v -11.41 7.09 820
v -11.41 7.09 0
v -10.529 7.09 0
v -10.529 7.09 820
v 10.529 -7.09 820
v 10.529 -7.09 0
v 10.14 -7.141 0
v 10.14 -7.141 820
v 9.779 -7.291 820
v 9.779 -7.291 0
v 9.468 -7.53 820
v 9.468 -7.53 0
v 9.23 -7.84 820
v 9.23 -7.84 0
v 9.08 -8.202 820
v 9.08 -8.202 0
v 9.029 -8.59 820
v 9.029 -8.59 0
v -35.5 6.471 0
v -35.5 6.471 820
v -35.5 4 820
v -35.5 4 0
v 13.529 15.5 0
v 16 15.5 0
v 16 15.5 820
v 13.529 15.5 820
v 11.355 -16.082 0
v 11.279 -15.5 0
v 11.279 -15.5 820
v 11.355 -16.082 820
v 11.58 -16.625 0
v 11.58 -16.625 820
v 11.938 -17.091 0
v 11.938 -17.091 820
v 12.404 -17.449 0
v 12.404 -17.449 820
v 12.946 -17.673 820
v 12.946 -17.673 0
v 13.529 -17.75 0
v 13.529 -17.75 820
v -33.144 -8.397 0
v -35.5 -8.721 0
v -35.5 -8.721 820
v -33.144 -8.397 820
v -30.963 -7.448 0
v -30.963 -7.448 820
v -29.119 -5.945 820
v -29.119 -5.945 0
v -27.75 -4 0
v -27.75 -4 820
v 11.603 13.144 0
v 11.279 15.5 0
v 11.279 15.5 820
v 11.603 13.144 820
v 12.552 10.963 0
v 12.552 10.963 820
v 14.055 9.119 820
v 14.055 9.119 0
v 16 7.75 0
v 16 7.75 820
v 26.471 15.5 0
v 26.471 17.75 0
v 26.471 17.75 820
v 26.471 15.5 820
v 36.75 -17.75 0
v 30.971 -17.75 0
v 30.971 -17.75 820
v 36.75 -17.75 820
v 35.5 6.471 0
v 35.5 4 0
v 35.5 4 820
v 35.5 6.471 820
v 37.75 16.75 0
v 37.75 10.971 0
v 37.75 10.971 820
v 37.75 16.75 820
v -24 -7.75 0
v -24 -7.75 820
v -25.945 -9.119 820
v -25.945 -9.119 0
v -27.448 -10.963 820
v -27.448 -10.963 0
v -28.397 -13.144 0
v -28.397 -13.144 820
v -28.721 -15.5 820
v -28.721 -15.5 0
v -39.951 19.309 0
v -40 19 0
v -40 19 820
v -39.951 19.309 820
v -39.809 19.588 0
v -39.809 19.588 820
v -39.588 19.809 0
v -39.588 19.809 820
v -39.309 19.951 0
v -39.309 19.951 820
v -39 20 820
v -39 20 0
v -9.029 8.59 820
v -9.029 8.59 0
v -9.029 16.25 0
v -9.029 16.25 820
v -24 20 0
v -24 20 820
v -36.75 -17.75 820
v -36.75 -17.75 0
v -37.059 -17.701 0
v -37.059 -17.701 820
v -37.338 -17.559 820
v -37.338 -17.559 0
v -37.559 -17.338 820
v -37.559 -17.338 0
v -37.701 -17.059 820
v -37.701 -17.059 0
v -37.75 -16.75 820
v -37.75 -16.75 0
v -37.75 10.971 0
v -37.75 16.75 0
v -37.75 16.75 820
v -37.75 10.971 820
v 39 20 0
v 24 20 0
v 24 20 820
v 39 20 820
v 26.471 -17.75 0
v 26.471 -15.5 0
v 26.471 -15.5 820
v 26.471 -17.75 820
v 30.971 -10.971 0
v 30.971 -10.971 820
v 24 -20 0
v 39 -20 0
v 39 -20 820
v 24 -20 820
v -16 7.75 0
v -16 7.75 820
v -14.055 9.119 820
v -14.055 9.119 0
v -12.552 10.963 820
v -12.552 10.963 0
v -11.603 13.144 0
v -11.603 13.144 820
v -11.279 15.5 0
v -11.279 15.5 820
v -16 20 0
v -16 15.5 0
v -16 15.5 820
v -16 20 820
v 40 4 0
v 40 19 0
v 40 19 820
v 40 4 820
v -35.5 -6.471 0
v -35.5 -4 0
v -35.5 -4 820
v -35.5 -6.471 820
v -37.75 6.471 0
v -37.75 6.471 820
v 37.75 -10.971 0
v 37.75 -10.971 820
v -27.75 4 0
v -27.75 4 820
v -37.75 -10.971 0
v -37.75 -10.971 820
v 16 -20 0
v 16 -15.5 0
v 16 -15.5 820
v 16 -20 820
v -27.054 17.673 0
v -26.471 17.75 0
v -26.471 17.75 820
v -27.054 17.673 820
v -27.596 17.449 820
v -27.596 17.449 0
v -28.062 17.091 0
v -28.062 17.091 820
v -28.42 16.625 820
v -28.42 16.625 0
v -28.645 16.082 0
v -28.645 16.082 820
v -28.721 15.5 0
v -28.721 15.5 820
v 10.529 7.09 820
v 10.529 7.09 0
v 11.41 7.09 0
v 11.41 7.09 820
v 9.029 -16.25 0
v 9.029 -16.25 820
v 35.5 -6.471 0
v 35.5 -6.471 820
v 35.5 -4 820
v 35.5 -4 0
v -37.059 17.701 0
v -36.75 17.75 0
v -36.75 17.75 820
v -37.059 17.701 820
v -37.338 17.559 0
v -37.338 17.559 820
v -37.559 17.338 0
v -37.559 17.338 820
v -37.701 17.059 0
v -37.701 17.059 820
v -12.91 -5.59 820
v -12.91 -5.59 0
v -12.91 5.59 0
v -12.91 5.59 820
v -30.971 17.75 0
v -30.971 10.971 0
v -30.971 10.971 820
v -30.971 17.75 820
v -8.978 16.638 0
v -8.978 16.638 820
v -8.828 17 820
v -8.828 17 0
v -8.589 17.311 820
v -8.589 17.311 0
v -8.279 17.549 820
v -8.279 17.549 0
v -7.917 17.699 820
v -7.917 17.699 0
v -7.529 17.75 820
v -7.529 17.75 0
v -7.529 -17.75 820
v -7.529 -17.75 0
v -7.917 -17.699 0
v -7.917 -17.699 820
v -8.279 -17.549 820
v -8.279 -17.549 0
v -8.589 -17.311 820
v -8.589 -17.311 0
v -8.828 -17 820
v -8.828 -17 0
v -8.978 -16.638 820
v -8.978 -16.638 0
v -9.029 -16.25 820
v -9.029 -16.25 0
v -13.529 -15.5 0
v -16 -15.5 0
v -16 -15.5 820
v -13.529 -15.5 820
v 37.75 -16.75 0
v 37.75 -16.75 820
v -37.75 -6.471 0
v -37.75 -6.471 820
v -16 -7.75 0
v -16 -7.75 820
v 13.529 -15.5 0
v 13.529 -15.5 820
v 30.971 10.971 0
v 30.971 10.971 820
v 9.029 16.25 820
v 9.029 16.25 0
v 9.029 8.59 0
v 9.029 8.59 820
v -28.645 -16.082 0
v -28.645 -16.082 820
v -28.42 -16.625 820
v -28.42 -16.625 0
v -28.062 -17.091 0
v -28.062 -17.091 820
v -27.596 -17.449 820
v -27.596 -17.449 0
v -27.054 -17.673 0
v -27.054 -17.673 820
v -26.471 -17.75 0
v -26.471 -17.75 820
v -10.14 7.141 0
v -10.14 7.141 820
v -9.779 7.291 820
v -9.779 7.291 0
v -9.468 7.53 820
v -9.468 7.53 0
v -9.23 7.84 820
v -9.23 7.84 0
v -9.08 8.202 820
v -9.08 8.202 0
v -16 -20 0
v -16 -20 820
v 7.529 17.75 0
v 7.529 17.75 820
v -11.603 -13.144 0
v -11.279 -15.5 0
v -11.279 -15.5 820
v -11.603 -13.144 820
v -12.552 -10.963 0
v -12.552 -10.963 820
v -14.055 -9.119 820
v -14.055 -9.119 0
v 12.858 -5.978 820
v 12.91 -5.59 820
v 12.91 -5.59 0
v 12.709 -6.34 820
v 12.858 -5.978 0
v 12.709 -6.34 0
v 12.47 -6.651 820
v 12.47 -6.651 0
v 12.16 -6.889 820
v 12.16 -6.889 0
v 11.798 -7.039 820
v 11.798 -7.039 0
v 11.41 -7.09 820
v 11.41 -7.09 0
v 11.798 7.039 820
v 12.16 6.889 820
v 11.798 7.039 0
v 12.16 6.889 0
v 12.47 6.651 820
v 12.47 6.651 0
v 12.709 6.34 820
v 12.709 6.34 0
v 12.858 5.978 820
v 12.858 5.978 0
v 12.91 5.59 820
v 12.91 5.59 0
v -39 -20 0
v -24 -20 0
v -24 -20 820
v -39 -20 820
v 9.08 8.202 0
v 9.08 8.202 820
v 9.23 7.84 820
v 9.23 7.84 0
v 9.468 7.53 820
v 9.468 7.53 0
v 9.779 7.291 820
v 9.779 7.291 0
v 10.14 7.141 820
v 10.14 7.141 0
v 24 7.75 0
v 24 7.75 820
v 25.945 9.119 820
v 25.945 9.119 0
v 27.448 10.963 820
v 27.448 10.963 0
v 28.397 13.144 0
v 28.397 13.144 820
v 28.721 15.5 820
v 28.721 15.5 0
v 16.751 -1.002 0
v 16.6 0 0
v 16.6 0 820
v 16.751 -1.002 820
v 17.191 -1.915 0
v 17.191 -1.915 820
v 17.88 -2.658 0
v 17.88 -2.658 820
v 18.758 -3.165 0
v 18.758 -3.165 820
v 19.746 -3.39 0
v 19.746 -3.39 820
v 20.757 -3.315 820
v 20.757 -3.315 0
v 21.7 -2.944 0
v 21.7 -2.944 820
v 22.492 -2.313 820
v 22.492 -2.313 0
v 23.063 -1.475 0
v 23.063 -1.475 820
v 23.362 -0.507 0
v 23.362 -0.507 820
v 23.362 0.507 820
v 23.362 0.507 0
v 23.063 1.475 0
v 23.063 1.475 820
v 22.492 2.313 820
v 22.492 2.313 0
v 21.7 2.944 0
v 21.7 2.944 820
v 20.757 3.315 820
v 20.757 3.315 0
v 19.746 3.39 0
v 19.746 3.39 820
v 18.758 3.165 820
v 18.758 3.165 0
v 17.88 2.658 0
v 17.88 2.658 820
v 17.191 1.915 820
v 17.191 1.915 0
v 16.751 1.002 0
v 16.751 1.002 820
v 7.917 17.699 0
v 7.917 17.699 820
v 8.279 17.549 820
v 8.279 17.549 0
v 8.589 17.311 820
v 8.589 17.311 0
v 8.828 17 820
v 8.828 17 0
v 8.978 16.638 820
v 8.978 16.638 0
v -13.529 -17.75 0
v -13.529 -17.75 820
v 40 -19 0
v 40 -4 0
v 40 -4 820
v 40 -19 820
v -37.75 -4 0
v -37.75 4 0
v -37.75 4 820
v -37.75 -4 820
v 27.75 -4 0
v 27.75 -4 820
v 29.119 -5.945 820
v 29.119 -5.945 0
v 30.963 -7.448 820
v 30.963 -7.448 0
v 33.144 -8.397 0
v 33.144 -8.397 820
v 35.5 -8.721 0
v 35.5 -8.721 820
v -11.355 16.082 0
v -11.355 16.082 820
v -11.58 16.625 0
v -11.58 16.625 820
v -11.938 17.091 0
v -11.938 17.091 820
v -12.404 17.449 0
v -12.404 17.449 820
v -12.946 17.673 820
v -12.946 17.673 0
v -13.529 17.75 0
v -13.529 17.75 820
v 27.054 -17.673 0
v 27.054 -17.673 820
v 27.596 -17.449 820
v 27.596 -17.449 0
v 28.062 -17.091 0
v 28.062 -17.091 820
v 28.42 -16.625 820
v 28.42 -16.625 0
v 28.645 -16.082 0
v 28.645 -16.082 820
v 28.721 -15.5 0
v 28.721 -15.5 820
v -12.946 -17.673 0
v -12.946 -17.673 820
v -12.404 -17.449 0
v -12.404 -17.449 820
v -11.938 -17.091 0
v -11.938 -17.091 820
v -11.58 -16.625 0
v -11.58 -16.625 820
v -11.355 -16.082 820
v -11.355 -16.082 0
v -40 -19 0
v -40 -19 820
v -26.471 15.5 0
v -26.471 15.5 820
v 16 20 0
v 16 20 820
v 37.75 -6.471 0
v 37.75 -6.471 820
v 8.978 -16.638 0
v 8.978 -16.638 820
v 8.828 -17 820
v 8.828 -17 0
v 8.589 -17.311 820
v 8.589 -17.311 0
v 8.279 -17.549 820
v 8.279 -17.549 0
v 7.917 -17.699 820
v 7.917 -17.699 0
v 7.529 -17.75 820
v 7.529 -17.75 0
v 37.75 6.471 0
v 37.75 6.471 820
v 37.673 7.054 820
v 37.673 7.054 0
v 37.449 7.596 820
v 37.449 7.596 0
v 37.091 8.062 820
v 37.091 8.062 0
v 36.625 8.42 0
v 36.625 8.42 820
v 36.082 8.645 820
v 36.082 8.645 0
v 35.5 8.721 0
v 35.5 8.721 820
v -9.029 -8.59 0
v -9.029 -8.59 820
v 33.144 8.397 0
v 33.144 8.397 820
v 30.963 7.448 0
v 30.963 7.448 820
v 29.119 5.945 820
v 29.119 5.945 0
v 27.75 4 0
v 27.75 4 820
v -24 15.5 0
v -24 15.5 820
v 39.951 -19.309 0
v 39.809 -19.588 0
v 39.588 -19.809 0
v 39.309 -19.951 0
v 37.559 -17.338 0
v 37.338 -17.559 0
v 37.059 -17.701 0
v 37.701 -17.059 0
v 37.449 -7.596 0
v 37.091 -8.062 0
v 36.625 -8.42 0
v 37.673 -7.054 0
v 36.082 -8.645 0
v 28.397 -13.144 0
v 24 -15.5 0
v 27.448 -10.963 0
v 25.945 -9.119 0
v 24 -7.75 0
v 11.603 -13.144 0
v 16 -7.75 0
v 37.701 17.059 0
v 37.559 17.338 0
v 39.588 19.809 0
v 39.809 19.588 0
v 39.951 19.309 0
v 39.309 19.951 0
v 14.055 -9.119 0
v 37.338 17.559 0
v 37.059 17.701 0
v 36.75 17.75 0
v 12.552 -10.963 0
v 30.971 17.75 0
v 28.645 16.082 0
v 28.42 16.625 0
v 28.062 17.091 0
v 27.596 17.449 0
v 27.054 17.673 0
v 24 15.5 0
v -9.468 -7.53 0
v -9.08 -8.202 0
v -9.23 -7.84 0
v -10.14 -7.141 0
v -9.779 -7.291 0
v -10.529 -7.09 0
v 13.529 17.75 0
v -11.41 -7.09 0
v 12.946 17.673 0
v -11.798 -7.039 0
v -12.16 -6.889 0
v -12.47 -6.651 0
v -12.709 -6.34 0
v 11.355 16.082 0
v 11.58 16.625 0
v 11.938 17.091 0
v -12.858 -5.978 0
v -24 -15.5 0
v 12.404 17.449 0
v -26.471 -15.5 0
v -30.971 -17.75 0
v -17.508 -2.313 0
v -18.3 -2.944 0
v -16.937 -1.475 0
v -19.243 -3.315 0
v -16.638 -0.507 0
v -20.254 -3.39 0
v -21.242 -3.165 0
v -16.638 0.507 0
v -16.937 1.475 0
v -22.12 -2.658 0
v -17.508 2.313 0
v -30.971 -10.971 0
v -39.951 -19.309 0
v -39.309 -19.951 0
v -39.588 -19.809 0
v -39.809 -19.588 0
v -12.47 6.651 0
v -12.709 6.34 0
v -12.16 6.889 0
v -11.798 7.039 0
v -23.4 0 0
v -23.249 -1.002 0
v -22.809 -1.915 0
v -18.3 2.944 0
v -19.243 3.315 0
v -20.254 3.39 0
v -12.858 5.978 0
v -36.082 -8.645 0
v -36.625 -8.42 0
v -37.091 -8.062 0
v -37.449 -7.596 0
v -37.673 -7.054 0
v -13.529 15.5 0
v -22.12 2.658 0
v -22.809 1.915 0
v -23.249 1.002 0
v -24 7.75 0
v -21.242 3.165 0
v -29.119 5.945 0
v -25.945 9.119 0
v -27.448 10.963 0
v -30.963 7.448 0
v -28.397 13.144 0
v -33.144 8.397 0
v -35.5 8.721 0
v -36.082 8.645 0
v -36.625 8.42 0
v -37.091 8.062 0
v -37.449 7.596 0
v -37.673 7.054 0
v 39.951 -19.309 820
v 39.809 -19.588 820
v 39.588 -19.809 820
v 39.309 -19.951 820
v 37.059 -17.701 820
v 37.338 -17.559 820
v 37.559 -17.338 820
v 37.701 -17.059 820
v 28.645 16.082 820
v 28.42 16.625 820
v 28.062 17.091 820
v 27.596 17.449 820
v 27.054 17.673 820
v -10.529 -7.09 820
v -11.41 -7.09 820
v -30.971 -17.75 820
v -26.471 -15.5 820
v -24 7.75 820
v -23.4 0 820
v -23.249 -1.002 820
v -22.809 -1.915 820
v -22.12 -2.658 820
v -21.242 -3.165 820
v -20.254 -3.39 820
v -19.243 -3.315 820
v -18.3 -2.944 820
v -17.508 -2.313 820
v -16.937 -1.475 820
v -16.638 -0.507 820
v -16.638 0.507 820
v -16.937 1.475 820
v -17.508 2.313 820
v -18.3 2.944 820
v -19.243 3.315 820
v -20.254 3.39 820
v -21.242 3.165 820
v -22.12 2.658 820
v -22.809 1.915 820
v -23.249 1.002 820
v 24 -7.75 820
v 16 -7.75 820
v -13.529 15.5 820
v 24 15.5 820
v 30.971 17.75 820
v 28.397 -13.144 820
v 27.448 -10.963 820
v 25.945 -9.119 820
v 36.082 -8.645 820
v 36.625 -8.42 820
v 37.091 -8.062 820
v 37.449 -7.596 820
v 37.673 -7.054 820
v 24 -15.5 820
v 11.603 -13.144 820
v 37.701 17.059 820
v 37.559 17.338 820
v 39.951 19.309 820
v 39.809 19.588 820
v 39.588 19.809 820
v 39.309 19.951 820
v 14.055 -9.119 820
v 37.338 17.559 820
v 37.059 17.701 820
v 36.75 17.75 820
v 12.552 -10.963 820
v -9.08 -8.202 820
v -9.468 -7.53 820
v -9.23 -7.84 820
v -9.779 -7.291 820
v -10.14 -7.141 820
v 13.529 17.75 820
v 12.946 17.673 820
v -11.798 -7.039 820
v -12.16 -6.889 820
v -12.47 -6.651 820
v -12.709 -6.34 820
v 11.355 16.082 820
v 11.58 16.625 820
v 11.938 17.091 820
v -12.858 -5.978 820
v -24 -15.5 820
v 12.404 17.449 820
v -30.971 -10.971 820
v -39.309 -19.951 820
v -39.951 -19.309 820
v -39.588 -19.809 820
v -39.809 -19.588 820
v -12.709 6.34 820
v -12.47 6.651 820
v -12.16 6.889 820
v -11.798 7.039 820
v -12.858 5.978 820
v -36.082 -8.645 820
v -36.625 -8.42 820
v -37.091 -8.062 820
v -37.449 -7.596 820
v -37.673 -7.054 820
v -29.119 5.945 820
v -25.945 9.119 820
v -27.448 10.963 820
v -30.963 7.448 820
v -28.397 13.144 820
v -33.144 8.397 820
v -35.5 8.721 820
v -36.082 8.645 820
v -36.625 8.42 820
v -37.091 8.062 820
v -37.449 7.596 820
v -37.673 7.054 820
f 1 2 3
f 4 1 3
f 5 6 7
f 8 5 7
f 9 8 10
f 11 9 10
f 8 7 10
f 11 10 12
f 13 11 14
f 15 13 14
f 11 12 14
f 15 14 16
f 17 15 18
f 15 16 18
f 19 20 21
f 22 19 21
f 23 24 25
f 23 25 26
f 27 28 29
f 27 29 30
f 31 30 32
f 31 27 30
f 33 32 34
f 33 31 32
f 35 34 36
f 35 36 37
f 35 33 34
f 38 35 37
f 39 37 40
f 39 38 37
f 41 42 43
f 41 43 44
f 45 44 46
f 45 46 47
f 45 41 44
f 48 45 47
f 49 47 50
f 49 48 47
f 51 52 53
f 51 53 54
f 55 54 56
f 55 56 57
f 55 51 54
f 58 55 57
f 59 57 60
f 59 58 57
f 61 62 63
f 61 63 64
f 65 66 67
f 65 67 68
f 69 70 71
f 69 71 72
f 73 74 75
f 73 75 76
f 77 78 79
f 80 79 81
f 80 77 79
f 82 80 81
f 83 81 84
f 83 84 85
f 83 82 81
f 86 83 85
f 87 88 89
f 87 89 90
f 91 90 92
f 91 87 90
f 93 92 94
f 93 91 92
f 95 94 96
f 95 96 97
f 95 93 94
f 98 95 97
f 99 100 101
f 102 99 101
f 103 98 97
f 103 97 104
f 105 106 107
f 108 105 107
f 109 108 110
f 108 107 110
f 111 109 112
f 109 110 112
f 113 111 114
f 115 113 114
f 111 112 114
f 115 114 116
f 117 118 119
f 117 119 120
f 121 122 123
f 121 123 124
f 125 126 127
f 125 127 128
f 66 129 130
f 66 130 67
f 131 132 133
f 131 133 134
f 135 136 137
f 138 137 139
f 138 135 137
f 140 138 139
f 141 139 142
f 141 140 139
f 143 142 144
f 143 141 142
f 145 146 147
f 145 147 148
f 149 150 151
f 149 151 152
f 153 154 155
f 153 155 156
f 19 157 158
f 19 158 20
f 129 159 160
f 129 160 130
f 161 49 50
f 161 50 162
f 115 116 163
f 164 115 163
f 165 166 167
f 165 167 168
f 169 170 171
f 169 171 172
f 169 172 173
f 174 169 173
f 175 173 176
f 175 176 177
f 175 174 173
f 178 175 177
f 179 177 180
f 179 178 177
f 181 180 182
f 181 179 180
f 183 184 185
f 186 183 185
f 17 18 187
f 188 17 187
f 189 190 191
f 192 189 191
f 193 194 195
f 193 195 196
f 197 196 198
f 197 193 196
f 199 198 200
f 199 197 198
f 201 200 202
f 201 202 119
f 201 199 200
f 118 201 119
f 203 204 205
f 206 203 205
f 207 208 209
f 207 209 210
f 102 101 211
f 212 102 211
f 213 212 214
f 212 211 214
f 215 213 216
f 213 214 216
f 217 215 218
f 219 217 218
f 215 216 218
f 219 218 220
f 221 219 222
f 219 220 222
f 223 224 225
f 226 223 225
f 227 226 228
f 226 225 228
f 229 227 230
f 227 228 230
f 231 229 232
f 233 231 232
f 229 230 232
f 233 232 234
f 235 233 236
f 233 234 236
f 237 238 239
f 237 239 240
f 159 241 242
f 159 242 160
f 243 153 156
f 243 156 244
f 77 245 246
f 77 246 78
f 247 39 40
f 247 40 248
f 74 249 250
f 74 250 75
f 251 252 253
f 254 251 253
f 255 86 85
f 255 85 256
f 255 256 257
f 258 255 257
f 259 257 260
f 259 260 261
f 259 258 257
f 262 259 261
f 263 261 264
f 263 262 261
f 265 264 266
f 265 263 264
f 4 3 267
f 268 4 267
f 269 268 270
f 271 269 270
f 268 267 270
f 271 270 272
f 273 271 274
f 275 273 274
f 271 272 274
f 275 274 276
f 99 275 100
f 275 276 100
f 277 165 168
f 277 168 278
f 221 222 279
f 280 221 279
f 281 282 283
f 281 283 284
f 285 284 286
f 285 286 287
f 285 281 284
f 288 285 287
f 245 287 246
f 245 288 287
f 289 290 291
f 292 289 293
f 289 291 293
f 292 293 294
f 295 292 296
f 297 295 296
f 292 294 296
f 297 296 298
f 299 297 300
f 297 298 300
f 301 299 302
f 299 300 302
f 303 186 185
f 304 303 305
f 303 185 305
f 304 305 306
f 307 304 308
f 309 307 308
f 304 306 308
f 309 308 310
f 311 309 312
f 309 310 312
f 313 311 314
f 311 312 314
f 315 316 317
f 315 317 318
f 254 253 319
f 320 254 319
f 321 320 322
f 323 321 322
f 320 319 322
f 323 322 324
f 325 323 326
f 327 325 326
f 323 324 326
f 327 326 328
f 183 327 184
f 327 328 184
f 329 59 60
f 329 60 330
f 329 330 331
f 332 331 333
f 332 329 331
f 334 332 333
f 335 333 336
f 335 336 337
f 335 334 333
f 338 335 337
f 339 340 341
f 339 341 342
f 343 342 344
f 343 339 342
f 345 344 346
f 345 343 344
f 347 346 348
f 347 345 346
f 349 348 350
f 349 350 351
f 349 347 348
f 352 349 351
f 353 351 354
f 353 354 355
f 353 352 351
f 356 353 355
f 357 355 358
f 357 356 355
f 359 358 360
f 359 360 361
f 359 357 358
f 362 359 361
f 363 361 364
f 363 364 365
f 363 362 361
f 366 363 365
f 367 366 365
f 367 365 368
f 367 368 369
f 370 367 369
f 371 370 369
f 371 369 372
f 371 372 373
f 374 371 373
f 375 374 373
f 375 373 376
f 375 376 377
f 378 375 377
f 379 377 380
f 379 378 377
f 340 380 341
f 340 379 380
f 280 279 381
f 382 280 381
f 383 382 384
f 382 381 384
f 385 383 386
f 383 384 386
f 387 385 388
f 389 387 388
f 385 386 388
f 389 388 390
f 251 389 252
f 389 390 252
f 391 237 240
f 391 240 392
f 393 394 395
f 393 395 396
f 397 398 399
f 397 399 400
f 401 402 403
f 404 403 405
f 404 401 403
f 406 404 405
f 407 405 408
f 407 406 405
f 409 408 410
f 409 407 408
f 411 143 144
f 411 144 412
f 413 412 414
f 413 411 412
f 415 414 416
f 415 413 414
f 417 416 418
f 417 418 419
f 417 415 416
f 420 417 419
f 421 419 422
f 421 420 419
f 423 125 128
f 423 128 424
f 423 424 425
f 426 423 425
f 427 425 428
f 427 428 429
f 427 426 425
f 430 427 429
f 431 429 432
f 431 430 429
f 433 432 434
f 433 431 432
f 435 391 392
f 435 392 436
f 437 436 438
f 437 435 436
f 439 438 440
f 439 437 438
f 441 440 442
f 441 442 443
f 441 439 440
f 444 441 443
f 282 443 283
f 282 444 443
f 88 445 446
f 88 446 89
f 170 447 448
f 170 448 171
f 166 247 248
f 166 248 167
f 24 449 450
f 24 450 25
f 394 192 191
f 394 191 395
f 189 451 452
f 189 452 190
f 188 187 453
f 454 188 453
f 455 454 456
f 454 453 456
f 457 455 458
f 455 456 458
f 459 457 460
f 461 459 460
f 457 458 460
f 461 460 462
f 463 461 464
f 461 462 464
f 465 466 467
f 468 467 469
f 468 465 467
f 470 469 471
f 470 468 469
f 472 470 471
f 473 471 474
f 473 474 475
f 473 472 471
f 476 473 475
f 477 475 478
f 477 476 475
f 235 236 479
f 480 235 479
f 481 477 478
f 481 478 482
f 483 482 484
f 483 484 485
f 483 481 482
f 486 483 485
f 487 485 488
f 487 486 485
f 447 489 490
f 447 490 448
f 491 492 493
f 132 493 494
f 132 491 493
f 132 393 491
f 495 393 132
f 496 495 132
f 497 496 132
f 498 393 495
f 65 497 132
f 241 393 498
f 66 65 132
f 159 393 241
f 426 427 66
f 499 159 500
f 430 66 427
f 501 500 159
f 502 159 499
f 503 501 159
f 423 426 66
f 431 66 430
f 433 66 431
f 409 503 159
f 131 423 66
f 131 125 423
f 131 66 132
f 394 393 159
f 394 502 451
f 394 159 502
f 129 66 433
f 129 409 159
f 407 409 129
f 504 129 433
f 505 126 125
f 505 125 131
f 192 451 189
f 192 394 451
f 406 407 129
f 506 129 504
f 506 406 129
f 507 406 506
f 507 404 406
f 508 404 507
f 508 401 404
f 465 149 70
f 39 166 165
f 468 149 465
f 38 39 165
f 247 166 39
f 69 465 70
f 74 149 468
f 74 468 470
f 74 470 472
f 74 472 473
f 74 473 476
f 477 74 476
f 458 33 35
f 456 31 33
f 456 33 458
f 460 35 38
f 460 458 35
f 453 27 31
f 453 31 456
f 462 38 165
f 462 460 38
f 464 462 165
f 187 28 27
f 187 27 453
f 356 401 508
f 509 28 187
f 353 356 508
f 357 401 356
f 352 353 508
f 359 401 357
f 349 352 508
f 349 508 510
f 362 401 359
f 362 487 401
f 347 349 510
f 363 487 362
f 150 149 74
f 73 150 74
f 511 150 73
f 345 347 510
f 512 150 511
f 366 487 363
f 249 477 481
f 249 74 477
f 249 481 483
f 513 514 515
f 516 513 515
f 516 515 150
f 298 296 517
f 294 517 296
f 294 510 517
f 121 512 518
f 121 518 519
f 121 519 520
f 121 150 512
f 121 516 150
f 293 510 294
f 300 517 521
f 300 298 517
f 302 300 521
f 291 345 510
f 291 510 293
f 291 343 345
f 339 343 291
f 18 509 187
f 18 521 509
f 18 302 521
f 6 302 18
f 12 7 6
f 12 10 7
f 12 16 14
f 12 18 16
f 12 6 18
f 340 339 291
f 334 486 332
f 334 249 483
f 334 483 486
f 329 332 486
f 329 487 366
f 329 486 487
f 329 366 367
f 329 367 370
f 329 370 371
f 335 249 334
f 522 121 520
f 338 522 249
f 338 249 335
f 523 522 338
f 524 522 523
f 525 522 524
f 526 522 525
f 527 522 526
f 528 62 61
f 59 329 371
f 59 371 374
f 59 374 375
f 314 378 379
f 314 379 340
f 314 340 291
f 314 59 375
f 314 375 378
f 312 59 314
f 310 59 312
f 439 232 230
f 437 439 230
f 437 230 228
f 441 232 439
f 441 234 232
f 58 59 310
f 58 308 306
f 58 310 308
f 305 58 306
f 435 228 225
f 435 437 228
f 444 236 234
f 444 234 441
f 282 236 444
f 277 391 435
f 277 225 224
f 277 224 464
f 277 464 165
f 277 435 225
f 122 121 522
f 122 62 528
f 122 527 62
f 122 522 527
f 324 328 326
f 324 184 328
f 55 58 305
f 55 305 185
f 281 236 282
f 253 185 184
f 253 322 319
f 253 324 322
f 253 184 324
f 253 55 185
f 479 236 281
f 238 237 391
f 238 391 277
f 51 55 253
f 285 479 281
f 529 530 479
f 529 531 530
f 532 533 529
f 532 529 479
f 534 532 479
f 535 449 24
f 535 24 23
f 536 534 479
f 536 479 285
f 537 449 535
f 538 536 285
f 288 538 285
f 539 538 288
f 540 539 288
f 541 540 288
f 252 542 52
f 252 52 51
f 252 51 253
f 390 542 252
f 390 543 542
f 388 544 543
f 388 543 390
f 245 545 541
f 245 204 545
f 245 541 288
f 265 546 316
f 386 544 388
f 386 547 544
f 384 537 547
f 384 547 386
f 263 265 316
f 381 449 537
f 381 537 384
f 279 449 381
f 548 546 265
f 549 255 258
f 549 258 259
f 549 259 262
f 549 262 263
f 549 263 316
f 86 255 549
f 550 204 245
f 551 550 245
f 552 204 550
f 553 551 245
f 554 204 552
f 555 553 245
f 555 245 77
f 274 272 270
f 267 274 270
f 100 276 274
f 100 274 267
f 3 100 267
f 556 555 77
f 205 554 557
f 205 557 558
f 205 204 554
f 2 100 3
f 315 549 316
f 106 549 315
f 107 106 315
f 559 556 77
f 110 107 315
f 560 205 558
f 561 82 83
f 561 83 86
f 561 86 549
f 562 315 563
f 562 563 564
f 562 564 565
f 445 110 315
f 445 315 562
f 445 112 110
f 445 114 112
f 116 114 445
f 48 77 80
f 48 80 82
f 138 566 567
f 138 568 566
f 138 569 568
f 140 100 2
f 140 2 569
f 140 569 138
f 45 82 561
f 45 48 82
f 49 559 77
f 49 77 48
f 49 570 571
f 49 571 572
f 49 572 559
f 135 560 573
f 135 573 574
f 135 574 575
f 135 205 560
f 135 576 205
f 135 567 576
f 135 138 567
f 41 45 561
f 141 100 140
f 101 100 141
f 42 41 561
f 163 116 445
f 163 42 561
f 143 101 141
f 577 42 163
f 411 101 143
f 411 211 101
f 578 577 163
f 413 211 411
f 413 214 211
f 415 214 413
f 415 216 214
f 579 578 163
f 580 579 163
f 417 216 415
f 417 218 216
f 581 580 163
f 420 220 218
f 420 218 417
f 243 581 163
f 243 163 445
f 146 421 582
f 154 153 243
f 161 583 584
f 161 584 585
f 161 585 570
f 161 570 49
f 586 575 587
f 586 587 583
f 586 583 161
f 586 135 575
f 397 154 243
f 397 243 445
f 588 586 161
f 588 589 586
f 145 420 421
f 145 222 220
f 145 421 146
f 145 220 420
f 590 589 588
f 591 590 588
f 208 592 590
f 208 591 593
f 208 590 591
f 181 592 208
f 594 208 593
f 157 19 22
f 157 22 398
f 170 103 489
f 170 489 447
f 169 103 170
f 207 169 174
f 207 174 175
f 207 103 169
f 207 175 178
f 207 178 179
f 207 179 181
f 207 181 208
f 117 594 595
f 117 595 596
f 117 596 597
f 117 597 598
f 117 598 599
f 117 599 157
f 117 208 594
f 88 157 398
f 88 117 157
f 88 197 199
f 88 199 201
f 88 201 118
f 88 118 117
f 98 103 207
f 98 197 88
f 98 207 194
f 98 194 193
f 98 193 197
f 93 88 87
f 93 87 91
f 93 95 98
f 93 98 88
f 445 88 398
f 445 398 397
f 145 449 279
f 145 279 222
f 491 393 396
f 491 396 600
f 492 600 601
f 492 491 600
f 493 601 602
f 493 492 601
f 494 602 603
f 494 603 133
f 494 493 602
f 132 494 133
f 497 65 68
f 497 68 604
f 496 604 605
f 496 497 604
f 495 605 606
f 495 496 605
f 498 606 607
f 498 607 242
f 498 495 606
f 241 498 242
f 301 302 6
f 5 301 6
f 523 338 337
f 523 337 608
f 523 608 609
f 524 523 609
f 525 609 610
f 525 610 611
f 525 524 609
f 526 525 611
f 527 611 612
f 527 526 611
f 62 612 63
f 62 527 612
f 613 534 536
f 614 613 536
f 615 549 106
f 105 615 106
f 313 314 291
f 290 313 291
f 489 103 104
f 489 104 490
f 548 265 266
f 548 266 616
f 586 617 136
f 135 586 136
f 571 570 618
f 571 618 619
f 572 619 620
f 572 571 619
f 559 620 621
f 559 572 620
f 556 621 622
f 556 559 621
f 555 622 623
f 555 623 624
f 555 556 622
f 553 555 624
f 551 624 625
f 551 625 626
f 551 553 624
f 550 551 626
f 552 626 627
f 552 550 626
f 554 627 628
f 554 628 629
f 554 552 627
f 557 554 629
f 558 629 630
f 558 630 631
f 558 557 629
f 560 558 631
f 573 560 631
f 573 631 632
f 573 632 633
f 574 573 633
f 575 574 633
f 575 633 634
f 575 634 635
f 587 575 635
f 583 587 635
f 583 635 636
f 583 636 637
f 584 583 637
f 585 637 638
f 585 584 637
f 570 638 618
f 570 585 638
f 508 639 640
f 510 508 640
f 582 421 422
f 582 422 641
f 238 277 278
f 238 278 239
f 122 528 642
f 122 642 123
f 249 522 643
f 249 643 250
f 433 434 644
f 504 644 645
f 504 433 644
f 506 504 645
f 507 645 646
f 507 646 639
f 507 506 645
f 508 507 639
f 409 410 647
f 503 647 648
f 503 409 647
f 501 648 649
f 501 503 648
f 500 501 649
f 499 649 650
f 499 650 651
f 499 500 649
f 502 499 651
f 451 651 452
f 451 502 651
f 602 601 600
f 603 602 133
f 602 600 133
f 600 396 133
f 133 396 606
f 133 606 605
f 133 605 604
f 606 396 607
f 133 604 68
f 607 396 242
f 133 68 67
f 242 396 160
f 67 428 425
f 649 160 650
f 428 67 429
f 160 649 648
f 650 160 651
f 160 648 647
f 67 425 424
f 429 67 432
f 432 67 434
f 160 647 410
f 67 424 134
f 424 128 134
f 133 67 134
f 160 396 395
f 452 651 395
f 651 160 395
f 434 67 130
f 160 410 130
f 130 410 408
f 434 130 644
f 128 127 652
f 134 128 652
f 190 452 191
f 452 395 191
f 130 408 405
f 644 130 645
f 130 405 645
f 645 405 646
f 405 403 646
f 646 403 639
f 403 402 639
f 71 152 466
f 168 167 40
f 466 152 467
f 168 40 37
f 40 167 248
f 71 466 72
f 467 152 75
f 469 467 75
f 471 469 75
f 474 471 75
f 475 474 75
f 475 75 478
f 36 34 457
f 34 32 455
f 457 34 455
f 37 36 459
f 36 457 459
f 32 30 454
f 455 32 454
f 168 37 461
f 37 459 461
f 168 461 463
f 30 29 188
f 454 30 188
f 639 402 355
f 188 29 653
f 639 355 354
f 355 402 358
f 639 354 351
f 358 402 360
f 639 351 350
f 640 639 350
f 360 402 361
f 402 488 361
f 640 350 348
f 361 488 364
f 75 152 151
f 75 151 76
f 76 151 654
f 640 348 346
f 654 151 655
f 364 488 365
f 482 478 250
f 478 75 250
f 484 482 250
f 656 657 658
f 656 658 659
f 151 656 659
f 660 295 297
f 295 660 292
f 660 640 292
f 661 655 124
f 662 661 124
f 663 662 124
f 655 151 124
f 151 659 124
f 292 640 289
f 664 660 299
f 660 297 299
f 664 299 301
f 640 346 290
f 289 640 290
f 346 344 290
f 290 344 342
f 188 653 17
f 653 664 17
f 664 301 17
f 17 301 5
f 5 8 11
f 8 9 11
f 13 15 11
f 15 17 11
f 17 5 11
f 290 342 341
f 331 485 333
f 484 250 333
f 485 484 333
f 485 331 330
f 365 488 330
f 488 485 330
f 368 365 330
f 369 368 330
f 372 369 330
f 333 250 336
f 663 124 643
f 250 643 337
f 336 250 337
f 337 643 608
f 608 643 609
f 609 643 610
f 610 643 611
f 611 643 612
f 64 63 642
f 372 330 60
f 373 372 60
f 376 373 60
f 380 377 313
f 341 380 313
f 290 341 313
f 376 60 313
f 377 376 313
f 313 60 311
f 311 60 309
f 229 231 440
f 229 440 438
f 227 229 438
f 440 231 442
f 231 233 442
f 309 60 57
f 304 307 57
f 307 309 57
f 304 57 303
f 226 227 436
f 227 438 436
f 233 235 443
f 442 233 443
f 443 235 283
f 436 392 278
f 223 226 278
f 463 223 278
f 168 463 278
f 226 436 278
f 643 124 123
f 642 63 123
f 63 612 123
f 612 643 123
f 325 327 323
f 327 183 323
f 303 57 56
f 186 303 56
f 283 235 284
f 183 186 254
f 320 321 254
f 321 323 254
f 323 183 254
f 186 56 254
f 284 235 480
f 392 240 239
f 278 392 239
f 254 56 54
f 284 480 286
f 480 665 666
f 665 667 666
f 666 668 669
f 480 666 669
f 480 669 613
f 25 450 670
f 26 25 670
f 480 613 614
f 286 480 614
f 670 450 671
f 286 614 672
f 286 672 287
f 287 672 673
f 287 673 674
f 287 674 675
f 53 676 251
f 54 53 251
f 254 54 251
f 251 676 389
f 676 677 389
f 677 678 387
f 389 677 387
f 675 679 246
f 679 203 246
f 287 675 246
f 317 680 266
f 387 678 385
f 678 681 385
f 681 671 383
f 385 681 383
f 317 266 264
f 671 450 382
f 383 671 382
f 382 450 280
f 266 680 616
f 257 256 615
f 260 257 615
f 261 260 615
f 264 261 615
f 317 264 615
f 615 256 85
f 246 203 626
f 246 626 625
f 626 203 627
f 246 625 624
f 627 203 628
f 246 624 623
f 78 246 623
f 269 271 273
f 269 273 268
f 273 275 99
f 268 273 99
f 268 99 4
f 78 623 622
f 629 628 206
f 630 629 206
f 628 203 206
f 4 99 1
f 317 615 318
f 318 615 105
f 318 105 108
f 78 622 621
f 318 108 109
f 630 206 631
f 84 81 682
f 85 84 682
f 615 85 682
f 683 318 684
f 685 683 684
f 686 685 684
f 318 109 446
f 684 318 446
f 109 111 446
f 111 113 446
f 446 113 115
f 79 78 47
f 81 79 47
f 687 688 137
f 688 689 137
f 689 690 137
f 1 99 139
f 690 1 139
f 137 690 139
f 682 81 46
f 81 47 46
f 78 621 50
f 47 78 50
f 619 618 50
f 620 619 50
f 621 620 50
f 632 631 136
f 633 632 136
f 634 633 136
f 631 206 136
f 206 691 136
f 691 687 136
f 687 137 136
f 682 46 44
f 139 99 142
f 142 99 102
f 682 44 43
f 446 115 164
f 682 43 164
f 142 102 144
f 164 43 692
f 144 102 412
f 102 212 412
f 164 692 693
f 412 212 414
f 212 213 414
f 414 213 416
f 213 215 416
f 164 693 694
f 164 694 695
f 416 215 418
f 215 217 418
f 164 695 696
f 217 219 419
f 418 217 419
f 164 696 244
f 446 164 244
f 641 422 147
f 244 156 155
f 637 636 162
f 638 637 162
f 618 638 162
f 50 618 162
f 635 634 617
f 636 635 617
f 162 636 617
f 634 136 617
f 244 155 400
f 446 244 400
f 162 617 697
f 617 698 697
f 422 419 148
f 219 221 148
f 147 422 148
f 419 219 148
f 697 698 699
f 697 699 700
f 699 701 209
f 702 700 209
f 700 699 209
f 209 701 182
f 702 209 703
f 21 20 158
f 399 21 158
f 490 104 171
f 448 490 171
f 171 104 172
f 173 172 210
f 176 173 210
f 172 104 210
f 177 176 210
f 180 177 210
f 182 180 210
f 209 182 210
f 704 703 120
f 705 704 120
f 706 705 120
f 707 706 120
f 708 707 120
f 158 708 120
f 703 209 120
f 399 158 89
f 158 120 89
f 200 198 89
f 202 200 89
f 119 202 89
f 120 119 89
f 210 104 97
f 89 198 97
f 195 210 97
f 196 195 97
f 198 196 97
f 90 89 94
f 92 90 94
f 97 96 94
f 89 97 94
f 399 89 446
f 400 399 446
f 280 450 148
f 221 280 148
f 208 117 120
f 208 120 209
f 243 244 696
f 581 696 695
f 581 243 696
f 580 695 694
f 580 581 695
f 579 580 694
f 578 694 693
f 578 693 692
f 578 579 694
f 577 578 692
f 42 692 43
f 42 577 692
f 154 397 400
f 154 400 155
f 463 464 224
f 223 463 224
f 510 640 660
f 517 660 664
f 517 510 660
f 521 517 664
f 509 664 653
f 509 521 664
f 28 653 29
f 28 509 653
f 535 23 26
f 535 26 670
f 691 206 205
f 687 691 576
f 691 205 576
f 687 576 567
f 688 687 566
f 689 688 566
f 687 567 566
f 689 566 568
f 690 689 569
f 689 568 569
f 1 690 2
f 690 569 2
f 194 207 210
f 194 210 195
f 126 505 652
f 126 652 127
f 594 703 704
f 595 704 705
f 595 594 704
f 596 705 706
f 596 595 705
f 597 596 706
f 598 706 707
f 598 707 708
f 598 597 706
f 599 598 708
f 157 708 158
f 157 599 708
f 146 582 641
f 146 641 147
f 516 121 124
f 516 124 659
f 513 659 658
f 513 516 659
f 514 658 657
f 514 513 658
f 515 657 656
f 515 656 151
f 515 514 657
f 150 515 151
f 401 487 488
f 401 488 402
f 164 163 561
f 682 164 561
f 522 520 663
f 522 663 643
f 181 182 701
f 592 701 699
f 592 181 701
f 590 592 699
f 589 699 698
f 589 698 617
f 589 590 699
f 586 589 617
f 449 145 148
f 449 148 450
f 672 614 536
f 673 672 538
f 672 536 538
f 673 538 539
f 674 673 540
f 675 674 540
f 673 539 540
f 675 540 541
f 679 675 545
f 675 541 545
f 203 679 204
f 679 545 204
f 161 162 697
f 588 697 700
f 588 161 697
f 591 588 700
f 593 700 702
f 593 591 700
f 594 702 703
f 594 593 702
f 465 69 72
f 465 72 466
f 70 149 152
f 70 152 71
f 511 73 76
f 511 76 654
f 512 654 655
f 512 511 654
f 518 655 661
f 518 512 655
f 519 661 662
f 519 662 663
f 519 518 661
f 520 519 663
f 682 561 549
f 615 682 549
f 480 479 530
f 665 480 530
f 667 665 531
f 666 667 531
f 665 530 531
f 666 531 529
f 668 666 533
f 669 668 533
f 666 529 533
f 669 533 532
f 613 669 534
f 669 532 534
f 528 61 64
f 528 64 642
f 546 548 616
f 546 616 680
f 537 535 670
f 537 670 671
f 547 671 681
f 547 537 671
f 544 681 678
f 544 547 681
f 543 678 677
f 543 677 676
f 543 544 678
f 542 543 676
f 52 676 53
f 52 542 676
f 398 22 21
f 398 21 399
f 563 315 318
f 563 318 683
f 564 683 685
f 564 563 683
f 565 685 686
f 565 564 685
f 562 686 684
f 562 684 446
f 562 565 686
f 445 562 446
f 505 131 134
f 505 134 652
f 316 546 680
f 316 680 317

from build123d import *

# Parameters (mm, degrees)
SZKIC1_R                    = 3.4
DODANIE_WYCI_GNI_CIE1_DEPTH = 820


with BuildPart() as part:
    # Szkic1 → Dodanie-wyciągnięcie1 (new body)
    with BuildSketch(Plane.XY):
        with BuildLine():
            Line((-40, -19), (-40, 19))
            ThreePointArc((-40, 19), (-39.707106781, 19.707106781), (-39, 20))
            Line((-39, 20), (-24, 20))
            Line((-24, 20), (-24, 15.5))
            Line((-24, 15.5), (-26.471381771, 15.5))
            Line((-26.471381771, 15.5), (-26.471381771, 17.75))
            ThreePointArc((-26.471381771, 17.75), (-28.062372029, 17.090990258), (-28.721381771, 15.5))
            ThreePointArc((-28.721381771, 15.5), (-27.448087912, 10.962546258), (-24, 7.75))
            Line((-24, 7.75), (-16, 7.75))
            ThreePointArc((-16, 7.75), (-12.551912088, 10.962546258), (-11.278618229, 15.5))
            ThreePointArc((-11.278618229, 15.5), (-11.937627971, 17.090990258), (-13.528618229, 17.75))
            Line((-13.528618229, 17.75), (-13.528618229, 15.5))
            Line((-13.528618229, 15.5), (-16, 15.5))
            Line((-16, 15.5), (-16, 20))
            Line((-16, 20), (13.528618229, 20))
            Line((13.528618229, 20), (16, 20))
            Line((16, 20), (16, 15.5))
            Line((16, 15.5), (13.528618229, 15.5))
            Line((13.528618229, 15.5), (13.528618229, 17.75))
            ThreePointArc((13.528618229, 17.75), (11.937627971, 17.090990258), (11.278618229, 15.5))
            ThreePointArc((11.278618229, 15.5), (12.551912088, 10.962546258), (16, 7.75))
            Line((16, 7.75), (24, 7.75))
            ThreePointArc((24, 7.75), (27.448087912, 10.962546258), (28.721381771, 15.5))
            ThreePointArc((28.721381771, 15.5), (28.062372029, 17.090990258), (26.471381771, 17.75))
            Line((26.471381771, 17.75), (26.471381771, 15.5))
            Line((26.471381771, 15.5), (24, 15.5))
            Line((24, 15.5), (24, 20))
            Line((24, 20), (39, 20))
            ThreePointArc((39, 20), (39.707106781, 19.707106781), (40, 19))
            Line((40, 19), (40, 4))
            Line((40, 4), (35.5, 4))
            Line((35.5, 4), (35.5, 6.471381771))
            Line((35.5, 6.471381771), (37.75, 6.471381771))
            ThreePointArc((37.75, 6.471381771), (37.090990258, 8.062372029), (35.5, 8.721381771))
            ThreePointArc((35.5, 8.721381771), (30.962546258, 7.448087912), (27.75, 4))
            Line((27.75, 4), (27.75, -4))
            ThreePointArc((27.75, -4), (30.962546258, -7.448087912), (35.5, -8.721381771))
            ThreePointArc((35.5, -8.721381771), (37.090990258, -8.062372029), (37.75, -6.471381771))
            Line((37.75, -6.471381771), (35.5, -6.471381771))
            Line((35.5, -6.471381771), (35.5, -4))
            Line((35.5, -4), (40, -4))
            Line((40, -4), (40, -19))
            ThreePointArc((40, -19), (39.707106781, -19.707106781), (39, -20))
            Line((39, -20), (24, -20))
            Line((24, -20), (24, -15.5))
            Line((24, -15.5), (26.471381771, -15.5))
            Line((26.471381771, -15.5), (26.471381771, -17.75))
            ThreePointArc((26.471381771, -17.75), (28.062372029, -17.090990258), (28.721381771, -15.5))
            ThreePointArc((28.721381771, -15.5), (27.448087912, -10.962546258), (24, -7.75))
            Line((24, -7.75), (16, -7.75))
            ThreePointArc((16, -7.75), (12.551912088, -10.962546258), (11.278618229, -15.5))
            ThreePointArc((11.278618229, -15.5), (11.937627971, -17.090990258), (13.528618229, -17.75))
            Line((13.528618229, -17.75), (13.528618229, -15.5))
            Line((13.528618229, -15.5), (16, -15.5))
            Line((16, -15.5), (16, -20))
            Line((16, -20), (-16, -20))
            Line((-16, -20), (-16, -15.5))
            Line((-16, -15.5), (-13.528618229, -15.5))
            Line((-13.528618229, -15.5), (-13.528618229, -17.75))
            ThreePointArc((-13.528618229, -17.75), (-11.937627971, -17.090990258), (-11.278618229, -15.5))
            ThreePointArc((-11.278618229, -15.5), (-12.551912088, -10.962546258), (-16, -7.75))
            Line((-16, -7.75), (-24, -7.75))
            ThreePointArc((-24, -7.75), (-27.448087912, -10.962546258), (-28.721381771, -15.5))
            ThreePointArc((-28.721381771, -15.5), (-28.062372029, -17.090990258), (-26.471381771, -17.75))
            Line((-26.471381771, -17.75), (-26.471381771, -15.5))
            Line((-26.471381771, -15.5), (-24, -15.5))
            Line((-24, -15.5), (-24, -20))
            Line((-24, -20), (-39, -20))
            ThreePointArc((-39, -20), (-39.707106781, -19.707106781), (-40, -19))
        make_face()
        with Locations(Location((-20, 0, 0), (0, 0, 180))):
            Circle(SZKIC1_R, mode=Mode.SUBTRACT)
        with Locations(Location((20, 0, 0), (0, 0, 180))):
            Circle(SZKIC1_R, mode=Mode.SUBTRACT)
        with BuildLine():
            Line((30.971381771, -17.75), (36.75, -17.75))
            ThreePointArc((36.75, -17.75), (37.457106781, -17.457106781), (37.75, -16.75))
            Line((37.75, -16.75), (37.75, -10.971381771))
            Line((37.75, -10.971381771), (30.971381771, -10.971381771))
            Line((30.971381771, -10.971381771), (30.971381771, -17.75))
        make_face(mode=Mode.SUBTRACT)
        with BuildLine():
            Line((-35.5, -6.471381771), (-37.75, -6.471381771))
            ThreePointArc((-37.75, -6.471381771), (-37.090990258, -8.062372029), (-35.5, -8.721381771))
            ThreePointArc((-35.5, -8.721381771), (-30.962546258, -7.448087912), (-27.75, -4))
            Line((-27.75, -4), (-27.75, 4))
            ThreePointArc((-27.75, 4), (-30.962546258, 7.448087912), (-35.5, 8.721381771))
            ThreePointArc((-35.5, 8.721381771), (-37.090990258, 8.062372029), (-37.75, 6.471381771))
            Line((-37.75, 6.471381771), (-35.5, 6.471381771))
            Line((-35.5, 6.471381771), (-35.5, 4))
            Line((-35.5, 4), (-37.75, 4))
            Line((-37.75, 4), (-37.75, -4))
            Line((-37.75, -4), (-35.5, -4))
            Line((-35.5, -4), (-35.5, -6.471381771))
        make_face(mode=Mode.SUBTRACT)
        with BuildLine():
            Line((10.528618229, 7.090188806), (11.40950808, 7.090188806))
            ThreePointArc((11.40950808, 7.090188806), (12.470168251, 6.650848977), (12.90950808, 5.590188806))
            Line((12.90950808, 5.590188806), (12.90950808, -5.590188806))
            ThreePointArc((12.90950808, -5.590188806), (12.470168251, -6.650848977), (11.40950808, -7.090188806))
            Line((11.40950808, -7.090188806), (10.528618229, -7.090188806))
            ThreePointArc((10.528618229, -7.090188806), (9.467958057, -7.529528634), (9.028618229, -8.590188806))
            Line((9.028618229, -8.590188806), (9.028618229, -16.25))
            ThreePointArc((9.028618229, -16.25), (8.589278401, -17.310660172), (7.528618229, -17.75))
            Line((7.528618229, -17.75), (-7.528618229, -17.75))
            ThreePointArc((-7.528618229, -17.75), (-8.589278401, -17.310660172), (-9.028618229, -16.25))
            Line((-9.028618229, -16.25), (-9.028618229, -8.590188806))
            ThreePointArc((-9.028618229, -8.590188806), (-9.467958057, -7.529528634), (-10.528618229, -7.090188806))
            Line((-10.528618229, -7.090188806), (-11.40950808, -7.090188806))
            ThreePointArc((-11.40950808, -7.090188806), (-12.470168251, -6.650848977), (-12.90950808, -5.590188806))
            Line((-12.90950808, -5.590188806), (-12.90950808, 5.590188806))
            ThreePointArc((-12.90950808, 5.590188806), (-12.470168251, 6.650848977), (-11.40950808, 7.090188806))
            Line((-11.40950808, 7.090188806), (-10.528618229, 7.090188806))
            ThreePointArc((-10.528618229, 7.090188806), (-9.467958057, 7.529528634), (-9.028618229, 8.590188806))
            Line((-9.028618229, 8.590188806), (-9.028618229, 16.25))
            ThreePointArc((-9.028618229, 16.25), (-8.589278401, 17.310660172), (-7.528618229, 17.75))
            Line((-7.528618229, 17.75), (7.528618229, 17.75))
            ThreePointArc((7.528618229, 17.75), (8.589278401, 17.310660172), (9.028618229, 16.25))
            Line((9.028618229, 16.25), (9.028618229, 8.590188806))
            ThreePointArc((9.028618229, 8.590188806), (9.467958057, 7.529528634), (10.528618229, 7.090188806))
        make_face(mode=Mode.SUBTRACT)
        with BuildLine():
            Line((30.971381771, 10.971381771), (37.75, 10.971381771))
            Line((37.75, 10.971381771), (37.75, 16.75))
            ThreePointArc((37.75, 16.75), (37.457106781, 17.457106781), (36.75, 17.75))
            Line((36.75, 17.75), (30.971381771, 17.75))
            Line((30.971381771, 17.75), (30.971381771, 10.971381771))
        make_face(mode=Mode.SUBTRACT)
        with BuildLine():
            Line((-30.971381771, -10.971381771), (-30.971381771, -17.75))
            Line((-30.971381771, -17.75), (-36.75, -17.75))
            ThreePointArc((-36.75, -17.75), (-37.457106781, -17.457106781), (-37.75, -16.75))
            Line((-37.75, -16.75), (-37.75, -10.971381771))
            Line((-37.75, -10.971381771), (-30.971381771, -10.971381771))
        make_face(mode=Mode.SUBTRACT)
        with BuildLine():
            Line((-30.971381771, 17.75), (-36.75, 17.75))
            ThreePointArc((-36.75, 17.75), (-37.457106781, 17.457106781), (-37.75, 16.75))
            Line((-37.75, 16.75), (-37.75, 10.971381771))
            Line((-37.75, 10.971381771), (-30.971381771, 10.971381771))
            Line((-30.971381771, 10.971381771), (-30.971381771, 17.75))
        make_face(mode=Mode.SUBTRACT)
    extrude(amount=DODANIE_WYCI_GNI_CIE1_DEPTH)


solid = part.part
